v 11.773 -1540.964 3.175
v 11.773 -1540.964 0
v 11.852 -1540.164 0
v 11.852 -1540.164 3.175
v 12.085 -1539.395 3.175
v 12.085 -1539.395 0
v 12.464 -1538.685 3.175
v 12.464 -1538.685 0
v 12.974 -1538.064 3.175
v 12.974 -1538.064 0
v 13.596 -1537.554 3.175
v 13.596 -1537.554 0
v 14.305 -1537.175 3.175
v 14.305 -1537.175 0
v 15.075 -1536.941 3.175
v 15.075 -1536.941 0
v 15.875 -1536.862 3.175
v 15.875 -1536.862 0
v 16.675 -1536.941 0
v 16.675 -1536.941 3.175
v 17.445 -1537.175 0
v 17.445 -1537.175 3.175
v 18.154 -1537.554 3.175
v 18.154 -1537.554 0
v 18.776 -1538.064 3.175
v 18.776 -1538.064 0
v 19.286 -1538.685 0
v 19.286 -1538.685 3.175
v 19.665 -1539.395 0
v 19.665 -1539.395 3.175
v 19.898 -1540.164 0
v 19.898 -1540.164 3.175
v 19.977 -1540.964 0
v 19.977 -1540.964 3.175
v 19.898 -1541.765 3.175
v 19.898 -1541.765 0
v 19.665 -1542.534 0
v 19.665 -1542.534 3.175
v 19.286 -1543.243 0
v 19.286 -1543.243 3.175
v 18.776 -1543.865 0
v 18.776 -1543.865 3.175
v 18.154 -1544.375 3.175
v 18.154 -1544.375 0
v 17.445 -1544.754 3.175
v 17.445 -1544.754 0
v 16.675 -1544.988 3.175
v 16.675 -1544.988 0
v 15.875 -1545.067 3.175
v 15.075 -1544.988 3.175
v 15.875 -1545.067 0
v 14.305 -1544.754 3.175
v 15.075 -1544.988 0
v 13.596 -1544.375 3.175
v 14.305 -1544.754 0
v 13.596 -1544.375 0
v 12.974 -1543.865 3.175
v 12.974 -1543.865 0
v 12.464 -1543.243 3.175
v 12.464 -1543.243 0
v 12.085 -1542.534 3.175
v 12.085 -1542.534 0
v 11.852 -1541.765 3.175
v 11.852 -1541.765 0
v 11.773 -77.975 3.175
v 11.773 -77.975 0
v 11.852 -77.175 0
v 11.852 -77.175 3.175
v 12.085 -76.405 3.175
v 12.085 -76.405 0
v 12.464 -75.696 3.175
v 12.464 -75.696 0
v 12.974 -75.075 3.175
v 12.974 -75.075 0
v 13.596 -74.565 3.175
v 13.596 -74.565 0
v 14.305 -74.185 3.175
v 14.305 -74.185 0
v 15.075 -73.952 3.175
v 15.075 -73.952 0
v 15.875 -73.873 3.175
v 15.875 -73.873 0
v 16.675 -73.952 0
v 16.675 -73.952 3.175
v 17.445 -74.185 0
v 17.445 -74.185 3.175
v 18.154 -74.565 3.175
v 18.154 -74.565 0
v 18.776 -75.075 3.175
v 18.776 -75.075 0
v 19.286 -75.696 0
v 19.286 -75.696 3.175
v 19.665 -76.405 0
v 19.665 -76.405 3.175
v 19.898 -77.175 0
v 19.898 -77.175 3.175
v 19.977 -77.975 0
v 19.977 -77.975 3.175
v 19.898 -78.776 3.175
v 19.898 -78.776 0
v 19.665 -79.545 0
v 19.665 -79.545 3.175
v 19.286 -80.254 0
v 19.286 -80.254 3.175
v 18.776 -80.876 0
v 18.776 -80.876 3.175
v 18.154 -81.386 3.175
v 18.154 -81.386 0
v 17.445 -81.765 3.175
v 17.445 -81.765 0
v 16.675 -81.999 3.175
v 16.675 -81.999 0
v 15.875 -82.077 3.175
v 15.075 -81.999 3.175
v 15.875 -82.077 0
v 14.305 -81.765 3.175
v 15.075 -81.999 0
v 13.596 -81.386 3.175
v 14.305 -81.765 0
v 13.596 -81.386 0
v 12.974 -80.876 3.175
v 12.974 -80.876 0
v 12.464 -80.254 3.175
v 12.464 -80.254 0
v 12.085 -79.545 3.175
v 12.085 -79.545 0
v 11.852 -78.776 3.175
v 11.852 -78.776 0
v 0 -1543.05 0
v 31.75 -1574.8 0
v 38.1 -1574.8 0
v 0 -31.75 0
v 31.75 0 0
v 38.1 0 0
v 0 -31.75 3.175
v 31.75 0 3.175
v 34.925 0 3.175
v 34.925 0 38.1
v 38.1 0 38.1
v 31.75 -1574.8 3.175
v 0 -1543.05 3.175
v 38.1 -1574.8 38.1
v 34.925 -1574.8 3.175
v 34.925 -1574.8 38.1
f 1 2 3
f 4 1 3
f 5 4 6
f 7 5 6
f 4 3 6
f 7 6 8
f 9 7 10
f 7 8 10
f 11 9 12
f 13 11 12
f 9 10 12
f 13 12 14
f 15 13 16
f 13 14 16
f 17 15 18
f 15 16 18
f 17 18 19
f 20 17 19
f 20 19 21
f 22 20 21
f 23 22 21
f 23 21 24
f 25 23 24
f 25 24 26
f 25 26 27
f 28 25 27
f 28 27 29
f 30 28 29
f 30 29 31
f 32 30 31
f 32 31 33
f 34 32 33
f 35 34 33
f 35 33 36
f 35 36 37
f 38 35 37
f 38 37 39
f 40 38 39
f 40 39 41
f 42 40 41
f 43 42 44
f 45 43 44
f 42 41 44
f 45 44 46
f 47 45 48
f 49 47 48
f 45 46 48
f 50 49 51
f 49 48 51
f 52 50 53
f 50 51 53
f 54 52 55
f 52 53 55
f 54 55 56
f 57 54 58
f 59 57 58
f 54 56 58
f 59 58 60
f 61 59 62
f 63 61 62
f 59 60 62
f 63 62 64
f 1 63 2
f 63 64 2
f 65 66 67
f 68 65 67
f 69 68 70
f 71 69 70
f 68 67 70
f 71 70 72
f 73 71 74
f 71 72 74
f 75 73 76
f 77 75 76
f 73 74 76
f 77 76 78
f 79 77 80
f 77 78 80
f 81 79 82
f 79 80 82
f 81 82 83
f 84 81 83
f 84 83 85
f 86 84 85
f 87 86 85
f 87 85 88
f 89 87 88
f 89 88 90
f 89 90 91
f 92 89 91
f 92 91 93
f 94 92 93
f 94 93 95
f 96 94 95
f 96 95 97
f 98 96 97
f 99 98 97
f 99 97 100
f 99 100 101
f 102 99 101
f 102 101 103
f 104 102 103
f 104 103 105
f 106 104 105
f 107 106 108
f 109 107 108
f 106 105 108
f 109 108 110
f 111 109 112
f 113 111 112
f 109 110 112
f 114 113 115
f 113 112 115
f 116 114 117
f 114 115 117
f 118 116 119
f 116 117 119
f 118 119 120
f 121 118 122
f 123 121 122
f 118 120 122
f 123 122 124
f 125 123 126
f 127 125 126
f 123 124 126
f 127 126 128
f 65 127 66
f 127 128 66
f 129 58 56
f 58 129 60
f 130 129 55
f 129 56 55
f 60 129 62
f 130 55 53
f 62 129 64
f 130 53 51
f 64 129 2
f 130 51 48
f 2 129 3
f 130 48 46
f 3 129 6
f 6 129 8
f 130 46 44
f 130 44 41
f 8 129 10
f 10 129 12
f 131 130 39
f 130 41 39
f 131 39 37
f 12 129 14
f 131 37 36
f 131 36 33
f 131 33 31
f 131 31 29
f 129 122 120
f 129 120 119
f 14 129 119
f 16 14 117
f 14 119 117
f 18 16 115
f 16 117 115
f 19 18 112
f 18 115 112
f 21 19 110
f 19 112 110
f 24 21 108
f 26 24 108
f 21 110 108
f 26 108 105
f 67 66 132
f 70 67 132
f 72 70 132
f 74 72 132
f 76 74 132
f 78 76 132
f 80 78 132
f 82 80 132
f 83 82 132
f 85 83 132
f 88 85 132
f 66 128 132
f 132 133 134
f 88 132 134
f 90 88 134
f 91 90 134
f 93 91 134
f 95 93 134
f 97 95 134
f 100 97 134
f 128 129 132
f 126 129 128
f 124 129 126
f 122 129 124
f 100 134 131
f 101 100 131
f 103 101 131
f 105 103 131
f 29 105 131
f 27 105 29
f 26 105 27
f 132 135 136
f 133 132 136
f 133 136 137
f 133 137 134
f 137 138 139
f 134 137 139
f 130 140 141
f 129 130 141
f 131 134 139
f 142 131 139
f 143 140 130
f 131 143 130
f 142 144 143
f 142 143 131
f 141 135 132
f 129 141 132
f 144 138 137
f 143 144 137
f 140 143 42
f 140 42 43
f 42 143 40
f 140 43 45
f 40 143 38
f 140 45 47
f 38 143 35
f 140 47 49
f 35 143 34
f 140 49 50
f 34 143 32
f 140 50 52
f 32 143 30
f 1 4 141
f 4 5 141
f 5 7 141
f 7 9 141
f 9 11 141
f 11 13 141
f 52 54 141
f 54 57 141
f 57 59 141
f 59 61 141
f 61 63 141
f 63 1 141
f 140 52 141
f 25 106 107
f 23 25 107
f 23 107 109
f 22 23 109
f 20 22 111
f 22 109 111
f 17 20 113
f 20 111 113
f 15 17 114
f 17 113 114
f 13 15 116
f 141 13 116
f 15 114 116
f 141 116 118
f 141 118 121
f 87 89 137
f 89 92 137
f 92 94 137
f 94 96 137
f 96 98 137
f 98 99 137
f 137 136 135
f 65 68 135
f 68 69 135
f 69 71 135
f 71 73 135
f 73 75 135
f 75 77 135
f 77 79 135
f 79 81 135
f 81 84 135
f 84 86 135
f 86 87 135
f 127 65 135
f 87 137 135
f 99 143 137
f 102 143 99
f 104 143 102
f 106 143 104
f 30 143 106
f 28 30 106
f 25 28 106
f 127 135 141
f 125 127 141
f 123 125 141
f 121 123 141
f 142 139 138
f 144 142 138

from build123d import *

# Parameters (mm, degrees)
F1_DEPTH = 1574.8
F3_DEPTH = 3.176
F5_D     = 8.2042


with BuildPart() as f1:
    # F0 (on Front) → F1 (new body)
    with BuildSketch(Plane.XZ):
        Polygon((0, 3.175), (0, 0), (38.1, 0), (38.1, 38.1), (34.925, 38.1), (34.925, 3.175), align=None)
    extrude(amount=F1_DEPTH)

    # F2 (on face) → F3 (cut, through all)
    with BuildSketch(Plane.XY.offset(3.175)):
        Polygon((0, -1574.8), (31.75, -1574.8), (0, -1543.05), align=None)
        Polygon((0, 0), (0, -31.75), (31.75, 0), align=None)
    extrude(amount=-F3_DEPTH, mode=Mode.SUBTRACT)

    # F5 (through all)
    with Locations(Plane.XY.offset(3.175)):
        with Locations((15.875, -1540.9644877579), (15.875, -77.9752877579)):
            Hole(F5_D / 2)


solid = f1.part
